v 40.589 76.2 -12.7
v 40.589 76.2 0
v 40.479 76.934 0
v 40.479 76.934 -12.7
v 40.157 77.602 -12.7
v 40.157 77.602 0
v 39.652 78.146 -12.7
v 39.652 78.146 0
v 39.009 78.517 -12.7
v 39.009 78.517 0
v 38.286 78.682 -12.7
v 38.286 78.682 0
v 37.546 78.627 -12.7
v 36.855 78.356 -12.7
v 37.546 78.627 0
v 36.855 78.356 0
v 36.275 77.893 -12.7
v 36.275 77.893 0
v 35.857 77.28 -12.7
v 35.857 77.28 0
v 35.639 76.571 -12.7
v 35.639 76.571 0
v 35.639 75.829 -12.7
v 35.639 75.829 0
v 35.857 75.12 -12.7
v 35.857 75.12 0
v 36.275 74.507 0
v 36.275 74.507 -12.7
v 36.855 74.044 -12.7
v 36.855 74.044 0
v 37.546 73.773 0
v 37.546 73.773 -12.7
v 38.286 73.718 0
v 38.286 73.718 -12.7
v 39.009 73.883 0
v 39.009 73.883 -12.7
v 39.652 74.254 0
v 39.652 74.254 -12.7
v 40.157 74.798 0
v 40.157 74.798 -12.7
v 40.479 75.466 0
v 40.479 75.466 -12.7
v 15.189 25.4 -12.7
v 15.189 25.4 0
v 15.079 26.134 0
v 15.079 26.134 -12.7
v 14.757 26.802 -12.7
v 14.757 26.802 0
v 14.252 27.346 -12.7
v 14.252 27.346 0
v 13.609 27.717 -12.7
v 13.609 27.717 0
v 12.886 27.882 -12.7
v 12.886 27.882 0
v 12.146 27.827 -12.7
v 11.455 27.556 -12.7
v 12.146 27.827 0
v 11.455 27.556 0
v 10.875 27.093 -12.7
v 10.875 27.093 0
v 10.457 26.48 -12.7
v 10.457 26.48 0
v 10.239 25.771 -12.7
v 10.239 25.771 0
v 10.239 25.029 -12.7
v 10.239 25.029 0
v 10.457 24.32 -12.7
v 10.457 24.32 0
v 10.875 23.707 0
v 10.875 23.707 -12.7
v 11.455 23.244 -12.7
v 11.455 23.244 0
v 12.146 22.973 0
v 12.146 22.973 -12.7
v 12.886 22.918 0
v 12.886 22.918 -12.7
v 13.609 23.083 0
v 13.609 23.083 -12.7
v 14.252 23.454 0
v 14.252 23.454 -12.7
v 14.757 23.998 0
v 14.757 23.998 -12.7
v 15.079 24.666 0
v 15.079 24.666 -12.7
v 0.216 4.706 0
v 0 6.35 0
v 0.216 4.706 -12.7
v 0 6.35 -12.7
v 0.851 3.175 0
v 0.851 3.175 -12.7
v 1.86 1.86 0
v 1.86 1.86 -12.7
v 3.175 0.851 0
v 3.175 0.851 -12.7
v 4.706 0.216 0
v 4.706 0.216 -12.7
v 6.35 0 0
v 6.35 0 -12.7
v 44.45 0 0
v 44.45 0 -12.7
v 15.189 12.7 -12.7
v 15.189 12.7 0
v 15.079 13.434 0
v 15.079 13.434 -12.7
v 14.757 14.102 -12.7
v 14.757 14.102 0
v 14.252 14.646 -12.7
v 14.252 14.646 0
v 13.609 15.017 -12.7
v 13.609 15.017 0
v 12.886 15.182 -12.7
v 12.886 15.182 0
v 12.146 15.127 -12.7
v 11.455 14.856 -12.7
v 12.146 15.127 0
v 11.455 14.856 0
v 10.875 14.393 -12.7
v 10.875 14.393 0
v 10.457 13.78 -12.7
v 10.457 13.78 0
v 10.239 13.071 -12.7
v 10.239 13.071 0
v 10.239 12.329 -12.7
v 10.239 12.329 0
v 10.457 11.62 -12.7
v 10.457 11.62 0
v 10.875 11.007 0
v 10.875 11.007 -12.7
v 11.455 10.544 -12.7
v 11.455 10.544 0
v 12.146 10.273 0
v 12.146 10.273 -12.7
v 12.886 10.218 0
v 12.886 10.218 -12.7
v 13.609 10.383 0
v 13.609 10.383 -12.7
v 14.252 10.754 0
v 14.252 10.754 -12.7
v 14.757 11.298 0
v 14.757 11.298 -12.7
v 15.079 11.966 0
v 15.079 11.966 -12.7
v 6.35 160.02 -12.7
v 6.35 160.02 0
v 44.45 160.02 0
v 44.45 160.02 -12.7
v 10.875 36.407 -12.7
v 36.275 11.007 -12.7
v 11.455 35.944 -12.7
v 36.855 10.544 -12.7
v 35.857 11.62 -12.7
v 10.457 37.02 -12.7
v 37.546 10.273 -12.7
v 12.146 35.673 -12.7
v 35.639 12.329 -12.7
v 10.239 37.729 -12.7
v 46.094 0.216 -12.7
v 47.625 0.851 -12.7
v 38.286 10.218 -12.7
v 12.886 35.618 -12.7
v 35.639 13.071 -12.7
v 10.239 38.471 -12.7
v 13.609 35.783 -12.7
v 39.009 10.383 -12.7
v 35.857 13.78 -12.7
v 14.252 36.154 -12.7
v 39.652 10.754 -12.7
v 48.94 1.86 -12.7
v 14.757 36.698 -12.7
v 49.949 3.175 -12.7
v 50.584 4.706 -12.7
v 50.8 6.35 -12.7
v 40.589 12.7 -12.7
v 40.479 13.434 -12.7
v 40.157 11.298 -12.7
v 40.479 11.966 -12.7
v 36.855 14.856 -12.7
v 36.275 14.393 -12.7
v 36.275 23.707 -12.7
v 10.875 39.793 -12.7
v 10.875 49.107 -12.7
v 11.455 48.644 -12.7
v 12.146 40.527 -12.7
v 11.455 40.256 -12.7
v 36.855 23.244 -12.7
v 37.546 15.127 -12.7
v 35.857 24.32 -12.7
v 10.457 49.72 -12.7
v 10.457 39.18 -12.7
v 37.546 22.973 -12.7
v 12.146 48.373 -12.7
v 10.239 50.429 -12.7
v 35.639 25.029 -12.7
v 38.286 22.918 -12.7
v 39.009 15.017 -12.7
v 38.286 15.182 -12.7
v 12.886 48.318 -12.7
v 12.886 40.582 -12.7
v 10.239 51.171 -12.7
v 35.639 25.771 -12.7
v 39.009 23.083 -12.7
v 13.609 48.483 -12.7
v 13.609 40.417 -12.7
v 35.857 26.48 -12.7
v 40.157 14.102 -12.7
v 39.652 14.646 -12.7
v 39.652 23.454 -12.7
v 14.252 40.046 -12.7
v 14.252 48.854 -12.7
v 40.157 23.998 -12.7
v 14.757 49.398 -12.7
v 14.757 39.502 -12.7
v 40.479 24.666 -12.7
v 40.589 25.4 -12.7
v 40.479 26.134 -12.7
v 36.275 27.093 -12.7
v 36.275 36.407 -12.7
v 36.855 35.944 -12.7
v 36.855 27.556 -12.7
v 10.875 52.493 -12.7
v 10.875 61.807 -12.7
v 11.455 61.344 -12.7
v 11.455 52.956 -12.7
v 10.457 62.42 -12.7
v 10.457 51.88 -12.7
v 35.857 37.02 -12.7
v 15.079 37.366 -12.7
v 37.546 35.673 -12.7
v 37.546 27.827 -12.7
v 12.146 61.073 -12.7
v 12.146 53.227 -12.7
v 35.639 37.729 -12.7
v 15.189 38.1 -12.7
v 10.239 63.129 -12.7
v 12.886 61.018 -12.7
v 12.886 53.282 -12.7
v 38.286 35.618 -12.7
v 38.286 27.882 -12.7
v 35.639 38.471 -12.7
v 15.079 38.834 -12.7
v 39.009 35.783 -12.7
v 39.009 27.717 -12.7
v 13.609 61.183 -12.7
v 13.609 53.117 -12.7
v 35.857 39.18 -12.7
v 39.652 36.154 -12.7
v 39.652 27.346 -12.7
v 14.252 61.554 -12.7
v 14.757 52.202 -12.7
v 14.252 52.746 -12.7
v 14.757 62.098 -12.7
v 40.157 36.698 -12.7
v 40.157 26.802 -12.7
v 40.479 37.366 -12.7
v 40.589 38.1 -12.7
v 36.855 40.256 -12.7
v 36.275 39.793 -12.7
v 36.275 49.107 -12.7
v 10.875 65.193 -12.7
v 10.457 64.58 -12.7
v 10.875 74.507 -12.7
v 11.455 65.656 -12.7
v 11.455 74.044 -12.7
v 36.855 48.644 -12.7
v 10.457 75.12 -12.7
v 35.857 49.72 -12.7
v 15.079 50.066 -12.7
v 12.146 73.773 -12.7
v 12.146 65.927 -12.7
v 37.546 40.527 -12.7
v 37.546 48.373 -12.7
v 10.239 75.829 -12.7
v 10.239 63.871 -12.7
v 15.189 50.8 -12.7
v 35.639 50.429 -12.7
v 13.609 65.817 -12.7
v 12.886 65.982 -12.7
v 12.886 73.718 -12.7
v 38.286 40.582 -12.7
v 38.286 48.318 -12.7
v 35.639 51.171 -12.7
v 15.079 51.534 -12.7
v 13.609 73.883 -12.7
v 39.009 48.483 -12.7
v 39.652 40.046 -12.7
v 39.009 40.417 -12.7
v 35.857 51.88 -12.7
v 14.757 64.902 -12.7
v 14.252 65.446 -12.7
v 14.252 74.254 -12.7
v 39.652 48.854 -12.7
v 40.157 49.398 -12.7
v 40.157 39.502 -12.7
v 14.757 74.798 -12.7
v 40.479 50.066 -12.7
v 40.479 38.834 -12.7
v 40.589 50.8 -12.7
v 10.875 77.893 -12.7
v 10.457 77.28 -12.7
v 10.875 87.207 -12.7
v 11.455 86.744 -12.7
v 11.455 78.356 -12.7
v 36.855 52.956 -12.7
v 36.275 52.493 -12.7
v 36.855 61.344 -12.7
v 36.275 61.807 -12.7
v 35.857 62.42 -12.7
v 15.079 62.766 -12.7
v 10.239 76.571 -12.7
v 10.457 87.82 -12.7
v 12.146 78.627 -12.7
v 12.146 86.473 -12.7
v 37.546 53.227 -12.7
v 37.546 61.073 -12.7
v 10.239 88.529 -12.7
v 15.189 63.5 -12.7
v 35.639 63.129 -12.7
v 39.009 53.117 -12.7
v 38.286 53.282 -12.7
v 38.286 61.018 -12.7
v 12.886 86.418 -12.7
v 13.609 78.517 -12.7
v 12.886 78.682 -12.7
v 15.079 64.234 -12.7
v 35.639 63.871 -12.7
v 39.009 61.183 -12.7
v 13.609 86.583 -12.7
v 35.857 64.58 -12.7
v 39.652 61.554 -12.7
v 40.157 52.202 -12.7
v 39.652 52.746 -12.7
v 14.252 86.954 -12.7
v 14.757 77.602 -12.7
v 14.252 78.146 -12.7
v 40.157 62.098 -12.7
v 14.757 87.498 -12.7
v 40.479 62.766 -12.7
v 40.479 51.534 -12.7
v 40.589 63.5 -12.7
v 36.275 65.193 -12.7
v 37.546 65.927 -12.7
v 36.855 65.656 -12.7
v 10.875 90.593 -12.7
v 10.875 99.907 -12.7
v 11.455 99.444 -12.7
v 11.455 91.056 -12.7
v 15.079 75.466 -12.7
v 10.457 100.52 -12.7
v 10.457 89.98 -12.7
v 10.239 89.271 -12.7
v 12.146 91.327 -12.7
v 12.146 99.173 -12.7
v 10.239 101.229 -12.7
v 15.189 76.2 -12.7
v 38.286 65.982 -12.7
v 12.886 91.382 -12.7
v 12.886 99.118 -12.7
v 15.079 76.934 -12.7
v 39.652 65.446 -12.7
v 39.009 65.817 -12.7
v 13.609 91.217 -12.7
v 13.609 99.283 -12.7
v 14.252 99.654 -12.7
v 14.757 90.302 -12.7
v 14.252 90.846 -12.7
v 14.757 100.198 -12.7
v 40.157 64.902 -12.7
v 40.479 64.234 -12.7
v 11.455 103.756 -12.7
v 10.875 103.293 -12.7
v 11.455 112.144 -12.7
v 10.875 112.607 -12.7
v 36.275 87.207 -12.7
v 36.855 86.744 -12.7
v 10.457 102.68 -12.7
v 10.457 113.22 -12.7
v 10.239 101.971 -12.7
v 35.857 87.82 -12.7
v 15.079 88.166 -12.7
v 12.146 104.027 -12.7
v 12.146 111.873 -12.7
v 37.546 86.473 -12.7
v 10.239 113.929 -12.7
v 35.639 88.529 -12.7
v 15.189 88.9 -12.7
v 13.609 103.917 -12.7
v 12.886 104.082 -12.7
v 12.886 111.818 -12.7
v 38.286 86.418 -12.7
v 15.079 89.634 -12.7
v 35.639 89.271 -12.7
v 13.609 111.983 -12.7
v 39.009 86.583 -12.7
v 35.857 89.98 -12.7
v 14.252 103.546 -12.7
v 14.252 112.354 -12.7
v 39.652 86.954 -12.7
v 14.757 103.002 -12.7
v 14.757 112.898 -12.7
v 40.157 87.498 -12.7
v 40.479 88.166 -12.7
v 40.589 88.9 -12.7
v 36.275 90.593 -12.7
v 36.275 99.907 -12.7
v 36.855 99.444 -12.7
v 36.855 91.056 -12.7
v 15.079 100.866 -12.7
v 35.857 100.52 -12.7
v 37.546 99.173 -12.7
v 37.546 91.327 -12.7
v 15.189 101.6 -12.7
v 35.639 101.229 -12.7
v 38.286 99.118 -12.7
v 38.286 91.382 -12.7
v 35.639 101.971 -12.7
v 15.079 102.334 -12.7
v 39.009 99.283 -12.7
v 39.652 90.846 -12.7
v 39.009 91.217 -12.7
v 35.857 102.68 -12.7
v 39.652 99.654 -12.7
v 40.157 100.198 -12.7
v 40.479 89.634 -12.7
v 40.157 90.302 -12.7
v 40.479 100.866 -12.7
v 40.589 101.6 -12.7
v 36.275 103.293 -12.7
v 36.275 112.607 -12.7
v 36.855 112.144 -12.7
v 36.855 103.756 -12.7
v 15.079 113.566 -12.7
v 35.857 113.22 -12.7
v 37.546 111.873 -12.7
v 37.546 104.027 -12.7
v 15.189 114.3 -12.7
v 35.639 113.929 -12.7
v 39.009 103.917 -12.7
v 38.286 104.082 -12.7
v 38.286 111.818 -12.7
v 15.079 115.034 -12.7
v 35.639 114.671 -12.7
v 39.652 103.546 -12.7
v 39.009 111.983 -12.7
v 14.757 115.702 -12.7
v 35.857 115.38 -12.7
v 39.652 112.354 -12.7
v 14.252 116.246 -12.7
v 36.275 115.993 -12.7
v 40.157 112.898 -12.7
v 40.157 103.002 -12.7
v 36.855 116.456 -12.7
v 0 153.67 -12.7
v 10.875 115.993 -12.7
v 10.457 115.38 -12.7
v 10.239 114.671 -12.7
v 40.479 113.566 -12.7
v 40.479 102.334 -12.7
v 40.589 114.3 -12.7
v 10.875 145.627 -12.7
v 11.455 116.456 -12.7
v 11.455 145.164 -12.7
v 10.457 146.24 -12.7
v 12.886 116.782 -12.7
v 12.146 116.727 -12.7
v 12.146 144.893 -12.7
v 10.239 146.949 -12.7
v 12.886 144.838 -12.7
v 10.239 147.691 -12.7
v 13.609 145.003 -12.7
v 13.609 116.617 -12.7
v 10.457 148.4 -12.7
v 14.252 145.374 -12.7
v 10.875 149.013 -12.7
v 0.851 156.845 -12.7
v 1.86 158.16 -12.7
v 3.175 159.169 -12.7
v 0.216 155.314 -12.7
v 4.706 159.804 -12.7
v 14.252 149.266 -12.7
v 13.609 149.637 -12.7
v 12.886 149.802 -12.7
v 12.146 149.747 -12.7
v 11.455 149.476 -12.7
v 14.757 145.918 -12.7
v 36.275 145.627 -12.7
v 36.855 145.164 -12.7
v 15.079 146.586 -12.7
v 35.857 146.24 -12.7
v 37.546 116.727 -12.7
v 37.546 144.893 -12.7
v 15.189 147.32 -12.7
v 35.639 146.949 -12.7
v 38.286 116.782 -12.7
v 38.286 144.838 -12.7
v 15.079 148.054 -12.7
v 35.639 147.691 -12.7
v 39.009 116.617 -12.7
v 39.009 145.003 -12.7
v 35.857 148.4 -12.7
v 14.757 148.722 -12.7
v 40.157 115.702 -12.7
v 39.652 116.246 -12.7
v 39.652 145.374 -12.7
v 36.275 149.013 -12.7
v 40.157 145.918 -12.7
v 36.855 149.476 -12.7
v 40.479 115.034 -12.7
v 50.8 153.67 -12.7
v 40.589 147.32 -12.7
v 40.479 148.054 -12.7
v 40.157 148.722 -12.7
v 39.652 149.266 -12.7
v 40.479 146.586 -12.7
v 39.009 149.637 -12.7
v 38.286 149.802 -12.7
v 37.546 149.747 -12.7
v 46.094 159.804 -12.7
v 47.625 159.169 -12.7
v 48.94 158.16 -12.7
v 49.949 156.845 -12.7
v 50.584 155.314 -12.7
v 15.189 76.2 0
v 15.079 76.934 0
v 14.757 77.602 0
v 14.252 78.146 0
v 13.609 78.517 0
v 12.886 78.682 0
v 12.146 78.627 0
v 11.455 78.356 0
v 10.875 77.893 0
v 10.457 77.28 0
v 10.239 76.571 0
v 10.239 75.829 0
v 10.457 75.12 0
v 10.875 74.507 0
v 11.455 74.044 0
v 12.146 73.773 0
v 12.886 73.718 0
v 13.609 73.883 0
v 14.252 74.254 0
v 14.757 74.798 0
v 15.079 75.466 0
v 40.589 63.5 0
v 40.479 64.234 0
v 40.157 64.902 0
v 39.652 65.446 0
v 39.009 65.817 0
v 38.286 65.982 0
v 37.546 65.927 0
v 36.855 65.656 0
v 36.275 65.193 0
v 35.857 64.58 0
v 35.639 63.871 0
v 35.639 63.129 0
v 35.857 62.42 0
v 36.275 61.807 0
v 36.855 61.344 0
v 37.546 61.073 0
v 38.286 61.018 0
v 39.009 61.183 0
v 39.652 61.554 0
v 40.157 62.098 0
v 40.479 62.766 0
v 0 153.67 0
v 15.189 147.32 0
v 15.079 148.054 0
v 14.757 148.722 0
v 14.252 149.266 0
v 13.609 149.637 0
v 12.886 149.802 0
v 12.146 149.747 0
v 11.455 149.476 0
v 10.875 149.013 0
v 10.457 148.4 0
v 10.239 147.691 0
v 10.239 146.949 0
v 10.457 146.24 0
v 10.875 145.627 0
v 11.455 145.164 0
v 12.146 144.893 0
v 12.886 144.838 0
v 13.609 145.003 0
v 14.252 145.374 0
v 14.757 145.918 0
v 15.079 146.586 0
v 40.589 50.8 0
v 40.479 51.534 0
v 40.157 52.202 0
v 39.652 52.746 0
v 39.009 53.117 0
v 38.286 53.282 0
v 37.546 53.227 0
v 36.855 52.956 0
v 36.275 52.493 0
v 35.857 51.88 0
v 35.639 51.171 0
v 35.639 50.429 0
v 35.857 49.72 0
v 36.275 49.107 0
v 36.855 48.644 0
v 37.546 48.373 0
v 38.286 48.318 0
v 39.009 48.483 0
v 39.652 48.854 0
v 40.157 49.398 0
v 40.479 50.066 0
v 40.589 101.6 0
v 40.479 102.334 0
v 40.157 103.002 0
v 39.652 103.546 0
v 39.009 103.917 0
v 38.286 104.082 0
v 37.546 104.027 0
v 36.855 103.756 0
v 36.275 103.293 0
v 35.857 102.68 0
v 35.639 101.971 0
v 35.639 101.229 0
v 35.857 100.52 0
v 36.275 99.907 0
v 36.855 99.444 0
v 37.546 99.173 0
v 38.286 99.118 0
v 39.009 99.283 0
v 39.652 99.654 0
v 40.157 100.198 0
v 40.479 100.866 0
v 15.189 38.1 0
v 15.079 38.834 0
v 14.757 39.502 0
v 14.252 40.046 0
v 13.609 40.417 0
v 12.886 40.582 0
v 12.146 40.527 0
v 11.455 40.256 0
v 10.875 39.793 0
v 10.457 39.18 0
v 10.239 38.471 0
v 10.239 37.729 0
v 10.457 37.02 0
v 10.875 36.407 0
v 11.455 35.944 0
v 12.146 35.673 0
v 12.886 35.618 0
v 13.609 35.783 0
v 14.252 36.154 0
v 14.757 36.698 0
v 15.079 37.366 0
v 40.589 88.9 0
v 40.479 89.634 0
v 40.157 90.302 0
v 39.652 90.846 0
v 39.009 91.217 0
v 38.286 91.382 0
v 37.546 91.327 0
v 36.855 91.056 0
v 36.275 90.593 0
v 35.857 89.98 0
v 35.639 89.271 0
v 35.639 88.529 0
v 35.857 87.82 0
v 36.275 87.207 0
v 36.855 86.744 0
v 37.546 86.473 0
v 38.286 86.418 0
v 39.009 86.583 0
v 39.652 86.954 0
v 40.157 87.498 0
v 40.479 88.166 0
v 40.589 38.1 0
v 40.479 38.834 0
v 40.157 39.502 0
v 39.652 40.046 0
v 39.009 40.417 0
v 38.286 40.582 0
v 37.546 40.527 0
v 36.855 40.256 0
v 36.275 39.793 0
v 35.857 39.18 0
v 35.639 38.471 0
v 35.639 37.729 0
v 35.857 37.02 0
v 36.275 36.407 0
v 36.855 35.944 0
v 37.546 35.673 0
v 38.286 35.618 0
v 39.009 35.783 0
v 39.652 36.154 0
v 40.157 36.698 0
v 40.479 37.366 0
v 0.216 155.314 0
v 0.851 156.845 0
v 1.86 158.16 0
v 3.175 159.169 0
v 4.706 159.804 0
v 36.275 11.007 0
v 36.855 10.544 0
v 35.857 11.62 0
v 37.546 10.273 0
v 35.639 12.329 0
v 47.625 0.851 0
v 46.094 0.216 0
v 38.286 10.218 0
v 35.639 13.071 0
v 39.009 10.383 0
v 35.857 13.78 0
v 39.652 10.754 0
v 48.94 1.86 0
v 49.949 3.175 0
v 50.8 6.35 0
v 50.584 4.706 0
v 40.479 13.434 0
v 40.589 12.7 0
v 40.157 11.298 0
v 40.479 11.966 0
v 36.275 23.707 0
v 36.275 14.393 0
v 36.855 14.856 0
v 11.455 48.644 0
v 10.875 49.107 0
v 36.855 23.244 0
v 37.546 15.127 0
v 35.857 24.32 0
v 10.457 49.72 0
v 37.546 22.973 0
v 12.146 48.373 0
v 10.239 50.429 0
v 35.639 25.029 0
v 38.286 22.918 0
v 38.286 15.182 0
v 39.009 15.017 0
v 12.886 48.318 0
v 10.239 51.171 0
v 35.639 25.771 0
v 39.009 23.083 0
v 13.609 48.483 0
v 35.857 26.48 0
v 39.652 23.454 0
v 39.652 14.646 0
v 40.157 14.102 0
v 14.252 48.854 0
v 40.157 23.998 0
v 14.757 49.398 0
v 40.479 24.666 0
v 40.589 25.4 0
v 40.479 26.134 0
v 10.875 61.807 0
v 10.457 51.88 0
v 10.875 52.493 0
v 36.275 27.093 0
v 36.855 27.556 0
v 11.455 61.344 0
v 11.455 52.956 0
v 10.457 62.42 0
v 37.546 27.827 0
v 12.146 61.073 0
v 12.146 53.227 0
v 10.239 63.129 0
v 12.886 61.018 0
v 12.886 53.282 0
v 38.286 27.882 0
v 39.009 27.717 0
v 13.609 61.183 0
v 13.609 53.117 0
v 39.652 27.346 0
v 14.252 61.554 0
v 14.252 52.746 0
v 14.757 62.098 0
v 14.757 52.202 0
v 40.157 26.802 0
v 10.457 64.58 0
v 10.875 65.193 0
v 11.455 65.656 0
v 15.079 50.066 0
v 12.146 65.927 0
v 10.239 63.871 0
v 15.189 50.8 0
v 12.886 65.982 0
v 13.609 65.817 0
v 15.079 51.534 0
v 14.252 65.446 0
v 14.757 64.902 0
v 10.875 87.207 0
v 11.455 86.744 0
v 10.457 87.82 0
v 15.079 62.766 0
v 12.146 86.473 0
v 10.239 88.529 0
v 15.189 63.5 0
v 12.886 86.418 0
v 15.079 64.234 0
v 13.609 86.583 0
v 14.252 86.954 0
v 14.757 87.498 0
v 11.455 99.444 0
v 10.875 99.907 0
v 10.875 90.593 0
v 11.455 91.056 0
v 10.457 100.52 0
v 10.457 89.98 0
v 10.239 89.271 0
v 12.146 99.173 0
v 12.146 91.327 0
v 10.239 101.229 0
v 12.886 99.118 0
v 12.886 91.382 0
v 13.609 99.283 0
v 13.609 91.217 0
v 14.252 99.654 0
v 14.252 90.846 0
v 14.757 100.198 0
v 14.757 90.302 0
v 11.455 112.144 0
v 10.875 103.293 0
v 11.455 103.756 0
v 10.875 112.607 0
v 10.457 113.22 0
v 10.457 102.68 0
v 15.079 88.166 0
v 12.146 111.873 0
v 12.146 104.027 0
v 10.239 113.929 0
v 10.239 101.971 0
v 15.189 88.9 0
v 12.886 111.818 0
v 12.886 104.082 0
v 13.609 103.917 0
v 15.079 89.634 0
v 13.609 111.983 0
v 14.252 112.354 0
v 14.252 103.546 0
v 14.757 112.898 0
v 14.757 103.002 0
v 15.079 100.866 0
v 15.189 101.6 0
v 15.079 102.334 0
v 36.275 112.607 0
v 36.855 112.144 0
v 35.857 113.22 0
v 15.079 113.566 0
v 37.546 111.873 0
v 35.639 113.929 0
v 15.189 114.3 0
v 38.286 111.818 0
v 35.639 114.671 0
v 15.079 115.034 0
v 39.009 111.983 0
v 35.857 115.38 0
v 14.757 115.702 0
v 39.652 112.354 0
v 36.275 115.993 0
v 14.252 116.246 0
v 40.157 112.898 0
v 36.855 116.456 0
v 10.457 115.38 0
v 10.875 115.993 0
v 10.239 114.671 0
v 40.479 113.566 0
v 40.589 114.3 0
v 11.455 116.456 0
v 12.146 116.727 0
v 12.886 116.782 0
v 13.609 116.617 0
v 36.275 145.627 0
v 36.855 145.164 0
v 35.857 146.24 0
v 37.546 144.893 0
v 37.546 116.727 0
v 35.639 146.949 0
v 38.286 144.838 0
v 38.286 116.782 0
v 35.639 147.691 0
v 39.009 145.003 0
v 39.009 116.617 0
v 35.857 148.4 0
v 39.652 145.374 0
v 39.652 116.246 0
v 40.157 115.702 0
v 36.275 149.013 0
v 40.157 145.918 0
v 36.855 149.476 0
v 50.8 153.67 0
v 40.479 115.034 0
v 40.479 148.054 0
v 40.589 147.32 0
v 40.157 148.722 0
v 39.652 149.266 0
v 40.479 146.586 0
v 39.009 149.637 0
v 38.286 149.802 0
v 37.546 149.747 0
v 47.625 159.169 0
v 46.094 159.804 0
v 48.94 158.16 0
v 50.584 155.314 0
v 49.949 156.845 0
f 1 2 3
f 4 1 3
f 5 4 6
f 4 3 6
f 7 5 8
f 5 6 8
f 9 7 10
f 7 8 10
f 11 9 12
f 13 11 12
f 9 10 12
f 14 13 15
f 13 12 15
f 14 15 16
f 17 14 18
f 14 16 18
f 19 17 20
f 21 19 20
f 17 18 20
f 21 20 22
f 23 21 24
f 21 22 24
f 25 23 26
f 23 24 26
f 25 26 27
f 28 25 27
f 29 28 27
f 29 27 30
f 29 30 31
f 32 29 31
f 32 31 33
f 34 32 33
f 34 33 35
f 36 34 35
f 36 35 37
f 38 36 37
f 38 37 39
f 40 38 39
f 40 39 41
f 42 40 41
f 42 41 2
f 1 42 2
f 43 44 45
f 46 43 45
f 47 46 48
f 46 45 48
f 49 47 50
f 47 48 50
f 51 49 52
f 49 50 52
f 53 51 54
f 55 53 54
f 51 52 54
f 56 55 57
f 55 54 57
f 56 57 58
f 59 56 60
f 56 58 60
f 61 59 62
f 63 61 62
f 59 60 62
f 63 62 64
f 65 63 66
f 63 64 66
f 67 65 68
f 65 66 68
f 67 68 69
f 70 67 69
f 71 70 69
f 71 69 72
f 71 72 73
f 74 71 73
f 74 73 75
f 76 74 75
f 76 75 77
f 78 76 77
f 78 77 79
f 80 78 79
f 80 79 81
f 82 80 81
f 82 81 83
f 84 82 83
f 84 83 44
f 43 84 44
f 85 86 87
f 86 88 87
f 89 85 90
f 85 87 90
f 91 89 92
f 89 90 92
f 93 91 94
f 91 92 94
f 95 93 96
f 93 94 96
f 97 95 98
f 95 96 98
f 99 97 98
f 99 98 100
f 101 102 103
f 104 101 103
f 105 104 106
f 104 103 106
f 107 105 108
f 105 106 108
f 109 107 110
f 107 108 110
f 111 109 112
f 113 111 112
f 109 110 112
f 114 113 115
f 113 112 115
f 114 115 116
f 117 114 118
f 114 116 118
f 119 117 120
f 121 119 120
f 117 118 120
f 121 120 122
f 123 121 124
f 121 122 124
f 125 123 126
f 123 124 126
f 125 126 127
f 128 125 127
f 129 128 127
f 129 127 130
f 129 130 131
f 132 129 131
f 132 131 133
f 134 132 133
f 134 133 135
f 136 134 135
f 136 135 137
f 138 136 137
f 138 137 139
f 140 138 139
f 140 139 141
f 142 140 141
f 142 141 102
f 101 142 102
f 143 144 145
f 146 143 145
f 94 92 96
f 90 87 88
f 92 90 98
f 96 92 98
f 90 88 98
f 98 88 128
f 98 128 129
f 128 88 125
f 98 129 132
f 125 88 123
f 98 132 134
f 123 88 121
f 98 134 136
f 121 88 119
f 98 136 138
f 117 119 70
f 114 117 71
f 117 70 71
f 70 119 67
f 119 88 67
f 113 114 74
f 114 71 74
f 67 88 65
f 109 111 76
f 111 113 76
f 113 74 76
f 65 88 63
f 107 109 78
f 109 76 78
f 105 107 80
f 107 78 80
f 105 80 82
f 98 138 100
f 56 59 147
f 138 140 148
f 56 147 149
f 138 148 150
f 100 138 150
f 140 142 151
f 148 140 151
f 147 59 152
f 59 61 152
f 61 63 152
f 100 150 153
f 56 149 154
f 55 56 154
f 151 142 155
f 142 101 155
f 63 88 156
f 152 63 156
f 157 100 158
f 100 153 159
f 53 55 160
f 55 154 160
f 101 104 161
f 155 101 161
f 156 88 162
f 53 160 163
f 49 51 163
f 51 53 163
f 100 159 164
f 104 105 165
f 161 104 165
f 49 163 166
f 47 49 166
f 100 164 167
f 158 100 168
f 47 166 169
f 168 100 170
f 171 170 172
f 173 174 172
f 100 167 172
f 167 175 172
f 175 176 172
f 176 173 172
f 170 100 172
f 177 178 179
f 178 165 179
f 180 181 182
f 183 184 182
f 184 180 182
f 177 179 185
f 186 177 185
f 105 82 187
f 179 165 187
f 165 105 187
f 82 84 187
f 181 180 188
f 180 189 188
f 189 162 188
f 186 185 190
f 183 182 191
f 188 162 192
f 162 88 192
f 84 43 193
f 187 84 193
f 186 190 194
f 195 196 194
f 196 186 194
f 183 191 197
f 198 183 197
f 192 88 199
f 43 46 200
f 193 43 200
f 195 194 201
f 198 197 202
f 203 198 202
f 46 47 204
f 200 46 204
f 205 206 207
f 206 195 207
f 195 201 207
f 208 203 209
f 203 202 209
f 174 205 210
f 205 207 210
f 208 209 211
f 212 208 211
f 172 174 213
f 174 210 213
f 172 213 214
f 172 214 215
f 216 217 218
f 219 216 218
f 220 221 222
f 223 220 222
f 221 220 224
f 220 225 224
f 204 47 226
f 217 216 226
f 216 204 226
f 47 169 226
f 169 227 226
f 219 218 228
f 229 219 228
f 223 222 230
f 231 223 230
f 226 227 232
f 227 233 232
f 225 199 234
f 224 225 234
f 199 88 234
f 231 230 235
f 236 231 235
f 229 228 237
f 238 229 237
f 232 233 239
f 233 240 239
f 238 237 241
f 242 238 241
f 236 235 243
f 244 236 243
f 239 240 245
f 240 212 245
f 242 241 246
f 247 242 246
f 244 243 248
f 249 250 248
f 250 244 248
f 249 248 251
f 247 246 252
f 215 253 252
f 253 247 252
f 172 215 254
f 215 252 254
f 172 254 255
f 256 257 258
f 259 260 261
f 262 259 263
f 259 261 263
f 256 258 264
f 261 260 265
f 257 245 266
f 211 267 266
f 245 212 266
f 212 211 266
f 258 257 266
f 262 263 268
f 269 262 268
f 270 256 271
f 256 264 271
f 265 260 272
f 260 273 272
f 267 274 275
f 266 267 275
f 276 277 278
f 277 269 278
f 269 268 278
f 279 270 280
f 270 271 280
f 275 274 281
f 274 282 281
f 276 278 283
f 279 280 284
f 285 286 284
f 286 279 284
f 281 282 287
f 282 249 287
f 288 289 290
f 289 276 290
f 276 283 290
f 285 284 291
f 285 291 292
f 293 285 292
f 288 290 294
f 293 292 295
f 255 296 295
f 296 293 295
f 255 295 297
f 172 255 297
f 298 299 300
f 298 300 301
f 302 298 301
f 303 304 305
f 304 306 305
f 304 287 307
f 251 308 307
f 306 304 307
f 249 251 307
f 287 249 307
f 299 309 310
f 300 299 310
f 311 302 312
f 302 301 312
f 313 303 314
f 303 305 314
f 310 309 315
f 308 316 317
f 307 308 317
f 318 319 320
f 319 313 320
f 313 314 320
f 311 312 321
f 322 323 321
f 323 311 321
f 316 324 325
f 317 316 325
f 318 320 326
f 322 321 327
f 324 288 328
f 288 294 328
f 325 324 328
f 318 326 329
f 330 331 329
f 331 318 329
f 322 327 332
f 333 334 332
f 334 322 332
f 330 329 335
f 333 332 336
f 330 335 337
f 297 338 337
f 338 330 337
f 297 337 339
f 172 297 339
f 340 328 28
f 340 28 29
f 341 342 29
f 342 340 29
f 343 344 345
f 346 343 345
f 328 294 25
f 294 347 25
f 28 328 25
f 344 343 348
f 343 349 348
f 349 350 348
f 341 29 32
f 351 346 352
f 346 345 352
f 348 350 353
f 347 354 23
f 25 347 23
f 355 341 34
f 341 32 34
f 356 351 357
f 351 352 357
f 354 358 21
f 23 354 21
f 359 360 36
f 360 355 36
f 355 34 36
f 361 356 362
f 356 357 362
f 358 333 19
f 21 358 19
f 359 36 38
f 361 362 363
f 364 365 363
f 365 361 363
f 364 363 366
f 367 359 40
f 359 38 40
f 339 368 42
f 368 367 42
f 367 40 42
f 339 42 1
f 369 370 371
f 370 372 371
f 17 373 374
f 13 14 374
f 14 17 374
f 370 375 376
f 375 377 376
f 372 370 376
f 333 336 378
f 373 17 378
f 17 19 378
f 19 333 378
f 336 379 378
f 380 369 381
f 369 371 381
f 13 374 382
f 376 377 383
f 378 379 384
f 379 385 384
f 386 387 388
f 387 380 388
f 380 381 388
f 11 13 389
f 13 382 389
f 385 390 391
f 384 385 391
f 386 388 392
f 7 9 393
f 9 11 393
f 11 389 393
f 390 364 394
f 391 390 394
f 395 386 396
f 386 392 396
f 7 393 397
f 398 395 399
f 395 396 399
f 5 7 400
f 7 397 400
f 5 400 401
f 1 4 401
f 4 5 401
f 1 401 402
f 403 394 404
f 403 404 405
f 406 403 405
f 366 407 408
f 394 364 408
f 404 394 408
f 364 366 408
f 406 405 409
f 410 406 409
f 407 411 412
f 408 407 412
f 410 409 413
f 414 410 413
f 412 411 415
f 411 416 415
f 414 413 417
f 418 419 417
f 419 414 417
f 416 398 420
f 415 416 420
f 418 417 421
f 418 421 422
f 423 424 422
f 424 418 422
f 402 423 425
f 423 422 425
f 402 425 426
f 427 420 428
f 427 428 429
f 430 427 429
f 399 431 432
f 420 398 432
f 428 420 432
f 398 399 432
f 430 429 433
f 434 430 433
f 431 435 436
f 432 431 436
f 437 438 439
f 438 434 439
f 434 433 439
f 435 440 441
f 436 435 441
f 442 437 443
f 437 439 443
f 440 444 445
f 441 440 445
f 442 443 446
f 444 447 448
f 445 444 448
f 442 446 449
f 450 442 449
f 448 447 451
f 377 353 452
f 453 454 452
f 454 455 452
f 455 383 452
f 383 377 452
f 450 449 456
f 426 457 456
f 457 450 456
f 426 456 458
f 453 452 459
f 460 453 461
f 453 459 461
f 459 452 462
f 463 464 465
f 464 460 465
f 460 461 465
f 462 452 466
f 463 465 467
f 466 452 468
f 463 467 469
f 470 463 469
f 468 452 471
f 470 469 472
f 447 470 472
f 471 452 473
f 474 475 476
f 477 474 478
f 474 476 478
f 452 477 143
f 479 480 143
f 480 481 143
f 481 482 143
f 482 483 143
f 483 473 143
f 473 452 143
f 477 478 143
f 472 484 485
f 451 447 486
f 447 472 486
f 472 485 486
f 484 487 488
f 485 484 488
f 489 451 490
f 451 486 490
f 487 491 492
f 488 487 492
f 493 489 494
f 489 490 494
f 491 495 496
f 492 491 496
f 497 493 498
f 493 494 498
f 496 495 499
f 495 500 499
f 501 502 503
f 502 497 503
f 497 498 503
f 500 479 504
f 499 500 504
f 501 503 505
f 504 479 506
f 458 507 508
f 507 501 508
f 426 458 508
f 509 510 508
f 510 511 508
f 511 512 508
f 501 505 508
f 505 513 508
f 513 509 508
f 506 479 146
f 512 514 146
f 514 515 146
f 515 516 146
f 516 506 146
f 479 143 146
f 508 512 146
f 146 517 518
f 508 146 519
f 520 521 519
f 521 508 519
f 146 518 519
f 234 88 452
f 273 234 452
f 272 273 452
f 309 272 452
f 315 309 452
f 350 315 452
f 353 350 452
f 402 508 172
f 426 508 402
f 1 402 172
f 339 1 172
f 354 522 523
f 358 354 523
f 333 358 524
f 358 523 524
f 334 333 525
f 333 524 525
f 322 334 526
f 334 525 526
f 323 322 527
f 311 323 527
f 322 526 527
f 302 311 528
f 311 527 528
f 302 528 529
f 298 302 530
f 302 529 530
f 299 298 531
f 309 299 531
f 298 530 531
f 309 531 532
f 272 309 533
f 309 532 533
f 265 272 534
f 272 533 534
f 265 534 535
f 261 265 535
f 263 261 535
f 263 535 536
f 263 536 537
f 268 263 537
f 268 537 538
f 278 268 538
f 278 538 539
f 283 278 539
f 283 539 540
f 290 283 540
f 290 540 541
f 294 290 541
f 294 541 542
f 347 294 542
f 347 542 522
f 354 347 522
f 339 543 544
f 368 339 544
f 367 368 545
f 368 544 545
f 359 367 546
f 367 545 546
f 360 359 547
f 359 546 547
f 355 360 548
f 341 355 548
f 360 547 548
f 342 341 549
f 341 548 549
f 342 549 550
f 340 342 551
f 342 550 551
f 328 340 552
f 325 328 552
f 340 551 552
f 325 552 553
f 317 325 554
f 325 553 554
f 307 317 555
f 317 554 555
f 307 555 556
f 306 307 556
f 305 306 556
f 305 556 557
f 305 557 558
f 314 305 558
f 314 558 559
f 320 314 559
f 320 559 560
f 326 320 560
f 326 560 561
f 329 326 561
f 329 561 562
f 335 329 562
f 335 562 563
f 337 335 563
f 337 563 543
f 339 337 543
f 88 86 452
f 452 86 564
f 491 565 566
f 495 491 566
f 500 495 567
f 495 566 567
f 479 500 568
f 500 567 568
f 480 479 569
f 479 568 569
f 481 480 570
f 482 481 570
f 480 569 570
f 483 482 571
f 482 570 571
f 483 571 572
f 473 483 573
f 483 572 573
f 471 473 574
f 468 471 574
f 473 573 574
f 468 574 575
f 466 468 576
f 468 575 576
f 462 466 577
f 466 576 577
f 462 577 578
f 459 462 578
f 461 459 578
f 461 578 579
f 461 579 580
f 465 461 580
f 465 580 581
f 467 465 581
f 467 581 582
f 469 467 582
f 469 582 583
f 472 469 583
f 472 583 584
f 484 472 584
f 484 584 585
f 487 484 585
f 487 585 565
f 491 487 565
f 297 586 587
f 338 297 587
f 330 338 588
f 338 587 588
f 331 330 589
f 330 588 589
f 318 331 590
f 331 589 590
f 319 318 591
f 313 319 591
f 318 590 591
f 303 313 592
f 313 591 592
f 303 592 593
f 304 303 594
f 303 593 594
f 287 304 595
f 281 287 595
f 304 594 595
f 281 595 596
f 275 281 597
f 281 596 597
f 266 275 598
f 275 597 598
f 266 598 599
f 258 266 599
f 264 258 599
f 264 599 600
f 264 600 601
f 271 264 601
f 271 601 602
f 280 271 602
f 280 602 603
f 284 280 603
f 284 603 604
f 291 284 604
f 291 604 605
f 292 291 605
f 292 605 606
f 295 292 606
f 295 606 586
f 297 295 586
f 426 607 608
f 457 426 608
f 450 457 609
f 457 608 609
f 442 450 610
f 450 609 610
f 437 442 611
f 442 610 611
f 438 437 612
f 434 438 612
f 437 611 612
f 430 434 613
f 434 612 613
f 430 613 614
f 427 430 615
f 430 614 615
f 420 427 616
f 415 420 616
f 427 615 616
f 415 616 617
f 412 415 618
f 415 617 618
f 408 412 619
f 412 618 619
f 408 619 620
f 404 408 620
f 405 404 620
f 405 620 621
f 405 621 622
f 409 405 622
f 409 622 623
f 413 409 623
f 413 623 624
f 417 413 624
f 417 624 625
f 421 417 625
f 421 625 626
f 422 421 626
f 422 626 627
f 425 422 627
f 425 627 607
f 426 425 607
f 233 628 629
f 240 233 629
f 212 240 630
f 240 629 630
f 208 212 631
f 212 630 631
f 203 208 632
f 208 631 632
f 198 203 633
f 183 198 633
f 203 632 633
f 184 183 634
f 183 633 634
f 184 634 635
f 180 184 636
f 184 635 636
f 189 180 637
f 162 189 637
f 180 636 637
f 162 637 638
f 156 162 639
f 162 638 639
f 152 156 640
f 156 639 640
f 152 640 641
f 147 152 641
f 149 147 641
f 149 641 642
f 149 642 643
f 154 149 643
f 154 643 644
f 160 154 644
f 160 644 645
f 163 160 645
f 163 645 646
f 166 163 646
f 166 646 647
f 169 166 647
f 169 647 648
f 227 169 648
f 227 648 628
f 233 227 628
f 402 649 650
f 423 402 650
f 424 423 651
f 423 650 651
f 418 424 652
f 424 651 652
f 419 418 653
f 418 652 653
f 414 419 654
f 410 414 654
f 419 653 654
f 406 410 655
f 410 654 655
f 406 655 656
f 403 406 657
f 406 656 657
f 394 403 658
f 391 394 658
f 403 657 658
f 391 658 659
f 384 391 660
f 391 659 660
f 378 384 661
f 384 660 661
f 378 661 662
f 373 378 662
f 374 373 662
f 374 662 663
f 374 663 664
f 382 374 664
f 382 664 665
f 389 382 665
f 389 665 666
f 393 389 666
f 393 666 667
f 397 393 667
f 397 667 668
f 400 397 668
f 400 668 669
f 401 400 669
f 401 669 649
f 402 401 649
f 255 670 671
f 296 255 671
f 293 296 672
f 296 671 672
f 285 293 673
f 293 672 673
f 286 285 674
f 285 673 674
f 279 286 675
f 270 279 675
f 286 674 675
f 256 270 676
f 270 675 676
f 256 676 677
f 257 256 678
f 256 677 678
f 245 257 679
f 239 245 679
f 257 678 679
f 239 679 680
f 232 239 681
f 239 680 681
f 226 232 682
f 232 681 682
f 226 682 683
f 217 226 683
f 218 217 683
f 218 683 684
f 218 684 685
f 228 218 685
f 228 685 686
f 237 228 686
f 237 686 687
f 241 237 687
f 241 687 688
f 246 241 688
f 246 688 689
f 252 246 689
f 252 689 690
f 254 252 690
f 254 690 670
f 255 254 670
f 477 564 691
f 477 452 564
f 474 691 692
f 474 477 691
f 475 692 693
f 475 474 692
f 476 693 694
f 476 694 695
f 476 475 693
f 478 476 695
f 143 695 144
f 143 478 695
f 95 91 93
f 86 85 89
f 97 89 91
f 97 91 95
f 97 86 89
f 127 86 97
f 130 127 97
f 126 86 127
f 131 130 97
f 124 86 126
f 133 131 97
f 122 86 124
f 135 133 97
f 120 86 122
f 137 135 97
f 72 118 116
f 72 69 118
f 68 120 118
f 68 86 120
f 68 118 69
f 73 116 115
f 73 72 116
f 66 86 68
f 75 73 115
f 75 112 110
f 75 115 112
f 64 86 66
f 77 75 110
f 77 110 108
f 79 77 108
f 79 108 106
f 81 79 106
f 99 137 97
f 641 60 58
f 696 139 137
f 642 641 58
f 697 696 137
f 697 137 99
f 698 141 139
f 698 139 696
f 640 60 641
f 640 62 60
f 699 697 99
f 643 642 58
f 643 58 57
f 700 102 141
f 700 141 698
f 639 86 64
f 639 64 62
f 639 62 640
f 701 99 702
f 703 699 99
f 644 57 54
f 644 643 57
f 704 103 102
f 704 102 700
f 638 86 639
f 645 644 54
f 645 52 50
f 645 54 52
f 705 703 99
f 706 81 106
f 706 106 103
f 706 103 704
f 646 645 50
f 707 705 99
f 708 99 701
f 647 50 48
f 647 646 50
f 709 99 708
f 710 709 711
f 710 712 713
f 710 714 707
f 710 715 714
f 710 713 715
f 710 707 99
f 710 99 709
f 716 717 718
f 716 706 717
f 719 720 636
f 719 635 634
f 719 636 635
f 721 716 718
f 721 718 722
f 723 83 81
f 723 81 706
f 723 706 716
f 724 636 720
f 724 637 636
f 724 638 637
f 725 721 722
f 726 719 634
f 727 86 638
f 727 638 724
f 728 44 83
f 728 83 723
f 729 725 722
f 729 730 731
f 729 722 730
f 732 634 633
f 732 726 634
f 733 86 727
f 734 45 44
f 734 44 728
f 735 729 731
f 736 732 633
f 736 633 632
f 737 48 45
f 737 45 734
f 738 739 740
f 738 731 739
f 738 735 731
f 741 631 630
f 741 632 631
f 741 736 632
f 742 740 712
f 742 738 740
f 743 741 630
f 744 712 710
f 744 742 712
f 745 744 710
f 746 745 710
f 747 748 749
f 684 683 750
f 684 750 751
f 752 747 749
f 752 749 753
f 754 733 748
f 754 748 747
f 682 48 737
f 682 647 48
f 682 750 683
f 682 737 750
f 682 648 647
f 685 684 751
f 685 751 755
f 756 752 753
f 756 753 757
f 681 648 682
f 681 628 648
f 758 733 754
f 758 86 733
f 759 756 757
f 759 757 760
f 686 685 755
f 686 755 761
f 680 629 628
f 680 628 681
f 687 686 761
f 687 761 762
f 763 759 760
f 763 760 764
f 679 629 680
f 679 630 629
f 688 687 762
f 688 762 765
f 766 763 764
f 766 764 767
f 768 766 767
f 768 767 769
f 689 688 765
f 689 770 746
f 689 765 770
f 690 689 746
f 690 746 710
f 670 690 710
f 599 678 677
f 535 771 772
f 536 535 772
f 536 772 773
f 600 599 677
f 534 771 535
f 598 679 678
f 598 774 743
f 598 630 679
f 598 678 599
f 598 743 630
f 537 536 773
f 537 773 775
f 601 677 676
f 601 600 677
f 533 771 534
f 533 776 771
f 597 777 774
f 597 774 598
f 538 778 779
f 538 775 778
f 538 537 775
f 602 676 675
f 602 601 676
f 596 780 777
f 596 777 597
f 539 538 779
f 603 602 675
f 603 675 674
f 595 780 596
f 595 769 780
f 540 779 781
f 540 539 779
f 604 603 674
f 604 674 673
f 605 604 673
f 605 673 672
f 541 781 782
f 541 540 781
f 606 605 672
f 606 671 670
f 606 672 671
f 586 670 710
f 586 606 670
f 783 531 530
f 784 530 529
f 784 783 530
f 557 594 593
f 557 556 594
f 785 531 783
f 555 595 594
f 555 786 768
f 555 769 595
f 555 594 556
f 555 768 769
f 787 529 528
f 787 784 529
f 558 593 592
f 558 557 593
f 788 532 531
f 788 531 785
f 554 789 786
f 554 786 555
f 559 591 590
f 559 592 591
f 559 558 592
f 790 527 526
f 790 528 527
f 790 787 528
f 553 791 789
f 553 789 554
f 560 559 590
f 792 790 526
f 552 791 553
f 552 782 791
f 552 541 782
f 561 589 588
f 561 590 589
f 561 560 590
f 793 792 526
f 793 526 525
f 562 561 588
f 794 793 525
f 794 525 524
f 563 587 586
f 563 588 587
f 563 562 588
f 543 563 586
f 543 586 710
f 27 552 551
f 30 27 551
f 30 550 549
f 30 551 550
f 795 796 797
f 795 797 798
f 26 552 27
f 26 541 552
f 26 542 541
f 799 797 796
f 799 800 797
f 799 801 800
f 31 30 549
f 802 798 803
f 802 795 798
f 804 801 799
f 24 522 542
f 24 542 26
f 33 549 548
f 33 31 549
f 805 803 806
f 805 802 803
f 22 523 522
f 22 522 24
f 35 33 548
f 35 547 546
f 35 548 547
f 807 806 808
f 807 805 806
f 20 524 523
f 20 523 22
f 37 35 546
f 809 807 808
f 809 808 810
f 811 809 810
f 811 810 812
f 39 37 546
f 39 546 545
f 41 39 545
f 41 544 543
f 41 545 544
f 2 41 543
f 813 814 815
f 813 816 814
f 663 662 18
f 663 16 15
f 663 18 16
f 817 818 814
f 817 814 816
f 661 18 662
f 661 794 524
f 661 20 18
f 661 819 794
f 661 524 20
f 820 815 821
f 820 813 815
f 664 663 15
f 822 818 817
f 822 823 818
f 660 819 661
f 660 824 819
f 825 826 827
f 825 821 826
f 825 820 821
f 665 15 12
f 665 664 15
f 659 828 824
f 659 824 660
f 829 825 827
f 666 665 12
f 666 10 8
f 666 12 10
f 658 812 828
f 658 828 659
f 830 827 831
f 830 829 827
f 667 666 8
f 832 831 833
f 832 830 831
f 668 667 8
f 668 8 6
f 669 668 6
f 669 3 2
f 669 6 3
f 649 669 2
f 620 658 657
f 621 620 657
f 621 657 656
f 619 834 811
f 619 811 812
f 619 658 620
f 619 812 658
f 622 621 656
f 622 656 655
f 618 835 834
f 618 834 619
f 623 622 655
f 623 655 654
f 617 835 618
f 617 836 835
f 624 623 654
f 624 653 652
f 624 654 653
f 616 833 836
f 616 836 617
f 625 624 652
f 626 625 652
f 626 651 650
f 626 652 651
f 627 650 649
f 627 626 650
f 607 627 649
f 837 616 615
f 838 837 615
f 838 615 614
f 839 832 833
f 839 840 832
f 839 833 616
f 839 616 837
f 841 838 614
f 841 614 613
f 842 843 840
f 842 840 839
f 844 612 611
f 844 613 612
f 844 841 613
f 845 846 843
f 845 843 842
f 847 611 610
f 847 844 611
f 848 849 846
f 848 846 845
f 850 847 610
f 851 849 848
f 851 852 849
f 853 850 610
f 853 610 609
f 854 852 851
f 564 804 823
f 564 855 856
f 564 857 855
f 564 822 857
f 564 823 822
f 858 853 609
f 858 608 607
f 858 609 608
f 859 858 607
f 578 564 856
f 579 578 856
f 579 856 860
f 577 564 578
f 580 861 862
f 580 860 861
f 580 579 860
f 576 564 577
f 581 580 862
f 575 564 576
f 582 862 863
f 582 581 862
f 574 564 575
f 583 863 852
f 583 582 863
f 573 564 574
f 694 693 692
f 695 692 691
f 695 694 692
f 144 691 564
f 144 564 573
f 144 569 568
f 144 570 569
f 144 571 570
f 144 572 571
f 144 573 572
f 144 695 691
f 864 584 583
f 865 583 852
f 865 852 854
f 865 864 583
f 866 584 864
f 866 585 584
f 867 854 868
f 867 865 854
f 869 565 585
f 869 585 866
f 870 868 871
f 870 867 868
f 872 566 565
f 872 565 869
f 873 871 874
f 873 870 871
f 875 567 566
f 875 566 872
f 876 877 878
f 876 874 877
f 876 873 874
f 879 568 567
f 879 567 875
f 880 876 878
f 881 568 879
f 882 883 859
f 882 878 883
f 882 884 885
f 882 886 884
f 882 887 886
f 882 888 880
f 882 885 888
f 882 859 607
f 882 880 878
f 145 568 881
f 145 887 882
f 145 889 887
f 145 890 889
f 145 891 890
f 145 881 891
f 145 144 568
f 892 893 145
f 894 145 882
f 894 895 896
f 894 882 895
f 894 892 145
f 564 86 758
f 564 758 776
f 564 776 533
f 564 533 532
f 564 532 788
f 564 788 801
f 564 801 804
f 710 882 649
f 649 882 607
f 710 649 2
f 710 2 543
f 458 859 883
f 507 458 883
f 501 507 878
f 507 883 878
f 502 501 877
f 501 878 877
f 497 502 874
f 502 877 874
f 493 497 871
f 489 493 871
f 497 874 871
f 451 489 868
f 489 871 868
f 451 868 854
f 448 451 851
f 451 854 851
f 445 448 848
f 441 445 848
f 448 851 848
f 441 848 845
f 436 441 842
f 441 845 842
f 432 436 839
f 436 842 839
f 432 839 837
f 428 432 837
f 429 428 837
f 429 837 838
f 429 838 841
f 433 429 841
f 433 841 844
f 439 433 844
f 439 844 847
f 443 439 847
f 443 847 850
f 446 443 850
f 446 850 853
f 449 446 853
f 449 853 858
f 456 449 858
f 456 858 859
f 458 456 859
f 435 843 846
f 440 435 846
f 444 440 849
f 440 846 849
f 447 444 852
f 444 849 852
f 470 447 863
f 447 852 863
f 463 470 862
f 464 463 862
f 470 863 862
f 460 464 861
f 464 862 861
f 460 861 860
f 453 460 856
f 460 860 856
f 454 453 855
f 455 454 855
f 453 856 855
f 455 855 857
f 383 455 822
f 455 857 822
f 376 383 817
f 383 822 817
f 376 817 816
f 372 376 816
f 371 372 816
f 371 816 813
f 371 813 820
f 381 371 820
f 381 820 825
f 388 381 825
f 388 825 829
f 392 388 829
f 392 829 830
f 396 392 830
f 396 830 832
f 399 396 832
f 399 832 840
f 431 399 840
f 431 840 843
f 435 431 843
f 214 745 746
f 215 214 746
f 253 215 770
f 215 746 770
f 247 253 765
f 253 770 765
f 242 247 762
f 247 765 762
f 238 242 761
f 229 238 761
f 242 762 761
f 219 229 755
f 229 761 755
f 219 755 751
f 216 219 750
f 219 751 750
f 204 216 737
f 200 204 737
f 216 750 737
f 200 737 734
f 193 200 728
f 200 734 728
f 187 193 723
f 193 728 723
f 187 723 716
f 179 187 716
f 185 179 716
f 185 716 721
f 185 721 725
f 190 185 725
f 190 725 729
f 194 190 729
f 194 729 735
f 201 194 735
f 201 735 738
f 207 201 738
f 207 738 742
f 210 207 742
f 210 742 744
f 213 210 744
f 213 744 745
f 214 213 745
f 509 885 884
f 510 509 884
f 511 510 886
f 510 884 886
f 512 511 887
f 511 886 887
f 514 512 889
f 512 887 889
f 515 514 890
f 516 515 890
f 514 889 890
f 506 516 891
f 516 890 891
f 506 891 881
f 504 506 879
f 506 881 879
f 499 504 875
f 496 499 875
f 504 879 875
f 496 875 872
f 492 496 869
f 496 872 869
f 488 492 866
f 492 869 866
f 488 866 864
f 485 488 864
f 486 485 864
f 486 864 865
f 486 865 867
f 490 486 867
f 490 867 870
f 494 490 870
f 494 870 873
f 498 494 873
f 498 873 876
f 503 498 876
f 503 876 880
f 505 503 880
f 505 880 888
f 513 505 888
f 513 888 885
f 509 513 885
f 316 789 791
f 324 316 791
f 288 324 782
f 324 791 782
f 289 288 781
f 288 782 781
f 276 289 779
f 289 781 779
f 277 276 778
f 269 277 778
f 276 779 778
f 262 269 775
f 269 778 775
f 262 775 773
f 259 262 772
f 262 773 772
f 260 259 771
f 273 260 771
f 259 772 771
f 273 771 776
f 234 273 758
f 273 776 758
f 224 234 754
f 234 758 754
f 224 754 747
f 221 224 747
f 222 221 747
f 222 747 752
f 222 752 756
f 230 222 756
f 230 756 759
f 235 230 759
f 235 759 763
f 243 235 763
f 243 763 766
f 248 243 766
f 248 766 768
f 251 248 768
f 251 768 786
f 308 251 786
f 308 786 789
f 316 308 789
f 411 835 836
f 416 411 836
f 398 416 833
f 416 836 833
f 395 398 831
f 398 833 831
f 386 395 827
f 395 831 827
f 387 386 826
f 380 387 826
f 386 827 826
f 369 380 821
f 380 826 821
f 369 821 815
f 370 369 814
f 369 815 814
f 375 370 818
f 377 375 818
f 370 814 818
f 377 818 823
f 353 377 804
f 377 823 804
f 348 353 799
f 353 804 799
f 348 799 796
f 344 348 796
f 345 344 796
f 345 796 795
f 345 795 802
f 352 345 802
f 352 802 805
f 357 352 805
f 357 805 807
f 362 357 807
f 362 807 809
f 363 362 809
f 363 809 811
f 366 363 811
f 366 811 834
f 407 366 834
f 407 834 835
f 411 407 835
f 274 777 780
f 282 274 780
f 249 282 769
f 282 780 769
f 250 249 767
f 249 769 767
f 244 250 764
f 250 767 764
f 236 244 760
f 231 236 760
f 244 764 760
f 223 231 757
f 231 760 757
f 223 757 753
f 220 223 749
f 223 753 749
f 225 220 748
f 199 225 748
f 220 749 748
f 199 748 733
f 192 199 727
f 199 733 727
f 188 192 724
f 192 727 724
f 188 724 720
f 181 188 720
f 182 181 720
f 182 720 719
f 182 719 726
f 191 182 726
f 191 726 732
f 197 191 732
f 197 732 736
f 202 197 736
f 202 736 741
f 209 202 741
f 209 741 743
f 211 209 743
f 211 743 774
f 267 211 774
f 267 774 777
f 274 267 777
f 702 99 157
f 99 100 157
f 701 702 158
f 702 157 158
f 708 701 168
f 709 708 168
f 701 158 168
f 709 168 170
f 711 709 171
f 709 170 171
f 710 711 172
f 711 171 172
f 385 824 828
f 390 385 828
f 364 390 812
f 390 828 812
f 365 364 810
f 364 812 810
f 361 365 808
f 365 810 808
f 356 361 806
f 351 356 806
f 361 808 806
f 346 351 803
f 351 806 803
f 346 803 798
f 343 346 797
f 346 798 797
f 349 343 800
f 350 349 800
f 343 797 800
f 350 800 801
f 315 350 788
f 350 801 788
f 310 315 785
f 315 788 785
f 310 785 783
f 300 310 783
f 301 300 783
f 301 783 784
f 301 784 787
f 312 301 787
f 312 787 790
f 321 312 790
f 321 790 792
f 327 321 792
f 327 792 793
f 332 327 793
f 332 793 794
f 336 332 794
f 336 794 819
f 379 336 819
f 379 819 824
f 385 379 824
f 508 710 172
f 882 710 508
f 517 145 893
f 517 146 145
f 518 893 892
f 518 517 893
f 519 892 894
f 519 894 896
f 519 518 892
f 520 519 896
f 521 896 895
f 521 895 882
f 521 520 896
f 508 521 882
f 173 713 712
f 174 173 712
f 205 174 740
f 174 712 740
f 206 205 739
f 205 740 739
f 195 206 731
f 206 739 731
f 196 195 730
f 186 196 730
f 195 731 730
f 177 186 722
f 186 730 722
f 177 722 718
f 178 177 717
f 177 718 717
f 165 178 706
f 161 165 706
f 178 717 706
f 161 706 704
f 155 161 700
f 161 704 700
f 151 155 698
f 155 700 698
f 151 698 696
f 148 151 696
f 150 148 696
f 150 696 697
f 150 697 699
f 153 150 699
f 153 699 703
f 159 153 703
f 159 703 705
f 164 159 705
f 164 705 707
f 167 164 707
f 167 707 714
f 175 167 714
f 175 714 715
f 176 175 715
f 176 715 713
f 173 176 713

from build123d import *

# Parameters (mm, degrees)
SKETCH2_W           = 50.8
SKETCH2_H           = 160.02
BOSS_EXTRUDE1_DEPTH = 12.7
SKETCH3_R           = 2.4892
CUT_EXTRUDE1_DEPTH  = 169.369624339
FILLET1_R           = 6.35


with BuildPart() as part:
    # Sketch2 → Boss-Extrude1 (new body)
    with BuildSketch(Plane.XY):
        with Locations((25.4, 80.01)):
            Rectangle(SKETCH2_W, SKETCH2_H)
    extrude(amount=-BOSS_EXTRUDE1_DEPTH)

    # Sketch3 → Cut-Extrude1 (cut, through all)
    with BuildSketch(Plane.XY):
        with Locations((12.7, 147.32)):
            Circle(SKETCH3_R)
        with Locations((38.1, 147.32)):
            Circle(SKETCH3_R)
        with Locations((12.7, 114.3)):
            Circle(SKETCH3_R)
        with Locations((12.7, 101.6)):
            Circle(SKETCH3_R)
        with Locations((12.7, 88.9)):
            Circle(SKETCH3_R)
        with Locations((12.7, 76.2)):
            Circle(SKETCH3_R)
        with Locations((12.7, 63.5)):
            Circle(SKETCH3_R)
        with Locations((12.7, 50.8)):
            Circle(SKETCH3_R)
        with Locations((12.7, 38.1)):
            Circle(SKETCH3_R)
        with Locations((12.7, 25.4)):
            Circle(SKETCH3_R)
        with Locations((12.7, 12.7)):
            Circle(SKETCH3_R)
        with Locations((38.1, 101.6)):
            Circle(SKETCH3_R)
        with Locations((38.1, 88.9)):
            Circle(SKETCH3_R)
        with Locations((38.1, 76.2)):
            Circle(SKETCH3_R)
        with Locations((38.1, 63.5)):
            Circle(SKETCH3_R)
        with Locations((38.1, 50.8)):
            Circle(SKETCH3_R)
        with Locations((38.1, 38.1)):
            Circle(SKETCH3_R)
        with Locations((38.1, 25.4)):
            Circle(SKETCH3_R)
        with Locations((38.1, 12.7)):
            Circle(SKETCH3_R)
        with Locations((38.1, 114.3)):
            Circle(SKETCH3_R)
    extrude(amount=-CUT_EXTRUDE1_DEPTH, mode=Mode.SUBTRACT)

    # Fillet1
    fillet1_edges = [part.edges().sort_by_distance(p)[0] for p in [
        (0, 160.02, -6.35),
        (50.8, 160.02, -6.35),
        (50.8, 0, -6.35),
        (0, 0, -6.35),
    ]]
    fillet(fillet1_edges, radius=FILLET1_R)


solid = part.part
